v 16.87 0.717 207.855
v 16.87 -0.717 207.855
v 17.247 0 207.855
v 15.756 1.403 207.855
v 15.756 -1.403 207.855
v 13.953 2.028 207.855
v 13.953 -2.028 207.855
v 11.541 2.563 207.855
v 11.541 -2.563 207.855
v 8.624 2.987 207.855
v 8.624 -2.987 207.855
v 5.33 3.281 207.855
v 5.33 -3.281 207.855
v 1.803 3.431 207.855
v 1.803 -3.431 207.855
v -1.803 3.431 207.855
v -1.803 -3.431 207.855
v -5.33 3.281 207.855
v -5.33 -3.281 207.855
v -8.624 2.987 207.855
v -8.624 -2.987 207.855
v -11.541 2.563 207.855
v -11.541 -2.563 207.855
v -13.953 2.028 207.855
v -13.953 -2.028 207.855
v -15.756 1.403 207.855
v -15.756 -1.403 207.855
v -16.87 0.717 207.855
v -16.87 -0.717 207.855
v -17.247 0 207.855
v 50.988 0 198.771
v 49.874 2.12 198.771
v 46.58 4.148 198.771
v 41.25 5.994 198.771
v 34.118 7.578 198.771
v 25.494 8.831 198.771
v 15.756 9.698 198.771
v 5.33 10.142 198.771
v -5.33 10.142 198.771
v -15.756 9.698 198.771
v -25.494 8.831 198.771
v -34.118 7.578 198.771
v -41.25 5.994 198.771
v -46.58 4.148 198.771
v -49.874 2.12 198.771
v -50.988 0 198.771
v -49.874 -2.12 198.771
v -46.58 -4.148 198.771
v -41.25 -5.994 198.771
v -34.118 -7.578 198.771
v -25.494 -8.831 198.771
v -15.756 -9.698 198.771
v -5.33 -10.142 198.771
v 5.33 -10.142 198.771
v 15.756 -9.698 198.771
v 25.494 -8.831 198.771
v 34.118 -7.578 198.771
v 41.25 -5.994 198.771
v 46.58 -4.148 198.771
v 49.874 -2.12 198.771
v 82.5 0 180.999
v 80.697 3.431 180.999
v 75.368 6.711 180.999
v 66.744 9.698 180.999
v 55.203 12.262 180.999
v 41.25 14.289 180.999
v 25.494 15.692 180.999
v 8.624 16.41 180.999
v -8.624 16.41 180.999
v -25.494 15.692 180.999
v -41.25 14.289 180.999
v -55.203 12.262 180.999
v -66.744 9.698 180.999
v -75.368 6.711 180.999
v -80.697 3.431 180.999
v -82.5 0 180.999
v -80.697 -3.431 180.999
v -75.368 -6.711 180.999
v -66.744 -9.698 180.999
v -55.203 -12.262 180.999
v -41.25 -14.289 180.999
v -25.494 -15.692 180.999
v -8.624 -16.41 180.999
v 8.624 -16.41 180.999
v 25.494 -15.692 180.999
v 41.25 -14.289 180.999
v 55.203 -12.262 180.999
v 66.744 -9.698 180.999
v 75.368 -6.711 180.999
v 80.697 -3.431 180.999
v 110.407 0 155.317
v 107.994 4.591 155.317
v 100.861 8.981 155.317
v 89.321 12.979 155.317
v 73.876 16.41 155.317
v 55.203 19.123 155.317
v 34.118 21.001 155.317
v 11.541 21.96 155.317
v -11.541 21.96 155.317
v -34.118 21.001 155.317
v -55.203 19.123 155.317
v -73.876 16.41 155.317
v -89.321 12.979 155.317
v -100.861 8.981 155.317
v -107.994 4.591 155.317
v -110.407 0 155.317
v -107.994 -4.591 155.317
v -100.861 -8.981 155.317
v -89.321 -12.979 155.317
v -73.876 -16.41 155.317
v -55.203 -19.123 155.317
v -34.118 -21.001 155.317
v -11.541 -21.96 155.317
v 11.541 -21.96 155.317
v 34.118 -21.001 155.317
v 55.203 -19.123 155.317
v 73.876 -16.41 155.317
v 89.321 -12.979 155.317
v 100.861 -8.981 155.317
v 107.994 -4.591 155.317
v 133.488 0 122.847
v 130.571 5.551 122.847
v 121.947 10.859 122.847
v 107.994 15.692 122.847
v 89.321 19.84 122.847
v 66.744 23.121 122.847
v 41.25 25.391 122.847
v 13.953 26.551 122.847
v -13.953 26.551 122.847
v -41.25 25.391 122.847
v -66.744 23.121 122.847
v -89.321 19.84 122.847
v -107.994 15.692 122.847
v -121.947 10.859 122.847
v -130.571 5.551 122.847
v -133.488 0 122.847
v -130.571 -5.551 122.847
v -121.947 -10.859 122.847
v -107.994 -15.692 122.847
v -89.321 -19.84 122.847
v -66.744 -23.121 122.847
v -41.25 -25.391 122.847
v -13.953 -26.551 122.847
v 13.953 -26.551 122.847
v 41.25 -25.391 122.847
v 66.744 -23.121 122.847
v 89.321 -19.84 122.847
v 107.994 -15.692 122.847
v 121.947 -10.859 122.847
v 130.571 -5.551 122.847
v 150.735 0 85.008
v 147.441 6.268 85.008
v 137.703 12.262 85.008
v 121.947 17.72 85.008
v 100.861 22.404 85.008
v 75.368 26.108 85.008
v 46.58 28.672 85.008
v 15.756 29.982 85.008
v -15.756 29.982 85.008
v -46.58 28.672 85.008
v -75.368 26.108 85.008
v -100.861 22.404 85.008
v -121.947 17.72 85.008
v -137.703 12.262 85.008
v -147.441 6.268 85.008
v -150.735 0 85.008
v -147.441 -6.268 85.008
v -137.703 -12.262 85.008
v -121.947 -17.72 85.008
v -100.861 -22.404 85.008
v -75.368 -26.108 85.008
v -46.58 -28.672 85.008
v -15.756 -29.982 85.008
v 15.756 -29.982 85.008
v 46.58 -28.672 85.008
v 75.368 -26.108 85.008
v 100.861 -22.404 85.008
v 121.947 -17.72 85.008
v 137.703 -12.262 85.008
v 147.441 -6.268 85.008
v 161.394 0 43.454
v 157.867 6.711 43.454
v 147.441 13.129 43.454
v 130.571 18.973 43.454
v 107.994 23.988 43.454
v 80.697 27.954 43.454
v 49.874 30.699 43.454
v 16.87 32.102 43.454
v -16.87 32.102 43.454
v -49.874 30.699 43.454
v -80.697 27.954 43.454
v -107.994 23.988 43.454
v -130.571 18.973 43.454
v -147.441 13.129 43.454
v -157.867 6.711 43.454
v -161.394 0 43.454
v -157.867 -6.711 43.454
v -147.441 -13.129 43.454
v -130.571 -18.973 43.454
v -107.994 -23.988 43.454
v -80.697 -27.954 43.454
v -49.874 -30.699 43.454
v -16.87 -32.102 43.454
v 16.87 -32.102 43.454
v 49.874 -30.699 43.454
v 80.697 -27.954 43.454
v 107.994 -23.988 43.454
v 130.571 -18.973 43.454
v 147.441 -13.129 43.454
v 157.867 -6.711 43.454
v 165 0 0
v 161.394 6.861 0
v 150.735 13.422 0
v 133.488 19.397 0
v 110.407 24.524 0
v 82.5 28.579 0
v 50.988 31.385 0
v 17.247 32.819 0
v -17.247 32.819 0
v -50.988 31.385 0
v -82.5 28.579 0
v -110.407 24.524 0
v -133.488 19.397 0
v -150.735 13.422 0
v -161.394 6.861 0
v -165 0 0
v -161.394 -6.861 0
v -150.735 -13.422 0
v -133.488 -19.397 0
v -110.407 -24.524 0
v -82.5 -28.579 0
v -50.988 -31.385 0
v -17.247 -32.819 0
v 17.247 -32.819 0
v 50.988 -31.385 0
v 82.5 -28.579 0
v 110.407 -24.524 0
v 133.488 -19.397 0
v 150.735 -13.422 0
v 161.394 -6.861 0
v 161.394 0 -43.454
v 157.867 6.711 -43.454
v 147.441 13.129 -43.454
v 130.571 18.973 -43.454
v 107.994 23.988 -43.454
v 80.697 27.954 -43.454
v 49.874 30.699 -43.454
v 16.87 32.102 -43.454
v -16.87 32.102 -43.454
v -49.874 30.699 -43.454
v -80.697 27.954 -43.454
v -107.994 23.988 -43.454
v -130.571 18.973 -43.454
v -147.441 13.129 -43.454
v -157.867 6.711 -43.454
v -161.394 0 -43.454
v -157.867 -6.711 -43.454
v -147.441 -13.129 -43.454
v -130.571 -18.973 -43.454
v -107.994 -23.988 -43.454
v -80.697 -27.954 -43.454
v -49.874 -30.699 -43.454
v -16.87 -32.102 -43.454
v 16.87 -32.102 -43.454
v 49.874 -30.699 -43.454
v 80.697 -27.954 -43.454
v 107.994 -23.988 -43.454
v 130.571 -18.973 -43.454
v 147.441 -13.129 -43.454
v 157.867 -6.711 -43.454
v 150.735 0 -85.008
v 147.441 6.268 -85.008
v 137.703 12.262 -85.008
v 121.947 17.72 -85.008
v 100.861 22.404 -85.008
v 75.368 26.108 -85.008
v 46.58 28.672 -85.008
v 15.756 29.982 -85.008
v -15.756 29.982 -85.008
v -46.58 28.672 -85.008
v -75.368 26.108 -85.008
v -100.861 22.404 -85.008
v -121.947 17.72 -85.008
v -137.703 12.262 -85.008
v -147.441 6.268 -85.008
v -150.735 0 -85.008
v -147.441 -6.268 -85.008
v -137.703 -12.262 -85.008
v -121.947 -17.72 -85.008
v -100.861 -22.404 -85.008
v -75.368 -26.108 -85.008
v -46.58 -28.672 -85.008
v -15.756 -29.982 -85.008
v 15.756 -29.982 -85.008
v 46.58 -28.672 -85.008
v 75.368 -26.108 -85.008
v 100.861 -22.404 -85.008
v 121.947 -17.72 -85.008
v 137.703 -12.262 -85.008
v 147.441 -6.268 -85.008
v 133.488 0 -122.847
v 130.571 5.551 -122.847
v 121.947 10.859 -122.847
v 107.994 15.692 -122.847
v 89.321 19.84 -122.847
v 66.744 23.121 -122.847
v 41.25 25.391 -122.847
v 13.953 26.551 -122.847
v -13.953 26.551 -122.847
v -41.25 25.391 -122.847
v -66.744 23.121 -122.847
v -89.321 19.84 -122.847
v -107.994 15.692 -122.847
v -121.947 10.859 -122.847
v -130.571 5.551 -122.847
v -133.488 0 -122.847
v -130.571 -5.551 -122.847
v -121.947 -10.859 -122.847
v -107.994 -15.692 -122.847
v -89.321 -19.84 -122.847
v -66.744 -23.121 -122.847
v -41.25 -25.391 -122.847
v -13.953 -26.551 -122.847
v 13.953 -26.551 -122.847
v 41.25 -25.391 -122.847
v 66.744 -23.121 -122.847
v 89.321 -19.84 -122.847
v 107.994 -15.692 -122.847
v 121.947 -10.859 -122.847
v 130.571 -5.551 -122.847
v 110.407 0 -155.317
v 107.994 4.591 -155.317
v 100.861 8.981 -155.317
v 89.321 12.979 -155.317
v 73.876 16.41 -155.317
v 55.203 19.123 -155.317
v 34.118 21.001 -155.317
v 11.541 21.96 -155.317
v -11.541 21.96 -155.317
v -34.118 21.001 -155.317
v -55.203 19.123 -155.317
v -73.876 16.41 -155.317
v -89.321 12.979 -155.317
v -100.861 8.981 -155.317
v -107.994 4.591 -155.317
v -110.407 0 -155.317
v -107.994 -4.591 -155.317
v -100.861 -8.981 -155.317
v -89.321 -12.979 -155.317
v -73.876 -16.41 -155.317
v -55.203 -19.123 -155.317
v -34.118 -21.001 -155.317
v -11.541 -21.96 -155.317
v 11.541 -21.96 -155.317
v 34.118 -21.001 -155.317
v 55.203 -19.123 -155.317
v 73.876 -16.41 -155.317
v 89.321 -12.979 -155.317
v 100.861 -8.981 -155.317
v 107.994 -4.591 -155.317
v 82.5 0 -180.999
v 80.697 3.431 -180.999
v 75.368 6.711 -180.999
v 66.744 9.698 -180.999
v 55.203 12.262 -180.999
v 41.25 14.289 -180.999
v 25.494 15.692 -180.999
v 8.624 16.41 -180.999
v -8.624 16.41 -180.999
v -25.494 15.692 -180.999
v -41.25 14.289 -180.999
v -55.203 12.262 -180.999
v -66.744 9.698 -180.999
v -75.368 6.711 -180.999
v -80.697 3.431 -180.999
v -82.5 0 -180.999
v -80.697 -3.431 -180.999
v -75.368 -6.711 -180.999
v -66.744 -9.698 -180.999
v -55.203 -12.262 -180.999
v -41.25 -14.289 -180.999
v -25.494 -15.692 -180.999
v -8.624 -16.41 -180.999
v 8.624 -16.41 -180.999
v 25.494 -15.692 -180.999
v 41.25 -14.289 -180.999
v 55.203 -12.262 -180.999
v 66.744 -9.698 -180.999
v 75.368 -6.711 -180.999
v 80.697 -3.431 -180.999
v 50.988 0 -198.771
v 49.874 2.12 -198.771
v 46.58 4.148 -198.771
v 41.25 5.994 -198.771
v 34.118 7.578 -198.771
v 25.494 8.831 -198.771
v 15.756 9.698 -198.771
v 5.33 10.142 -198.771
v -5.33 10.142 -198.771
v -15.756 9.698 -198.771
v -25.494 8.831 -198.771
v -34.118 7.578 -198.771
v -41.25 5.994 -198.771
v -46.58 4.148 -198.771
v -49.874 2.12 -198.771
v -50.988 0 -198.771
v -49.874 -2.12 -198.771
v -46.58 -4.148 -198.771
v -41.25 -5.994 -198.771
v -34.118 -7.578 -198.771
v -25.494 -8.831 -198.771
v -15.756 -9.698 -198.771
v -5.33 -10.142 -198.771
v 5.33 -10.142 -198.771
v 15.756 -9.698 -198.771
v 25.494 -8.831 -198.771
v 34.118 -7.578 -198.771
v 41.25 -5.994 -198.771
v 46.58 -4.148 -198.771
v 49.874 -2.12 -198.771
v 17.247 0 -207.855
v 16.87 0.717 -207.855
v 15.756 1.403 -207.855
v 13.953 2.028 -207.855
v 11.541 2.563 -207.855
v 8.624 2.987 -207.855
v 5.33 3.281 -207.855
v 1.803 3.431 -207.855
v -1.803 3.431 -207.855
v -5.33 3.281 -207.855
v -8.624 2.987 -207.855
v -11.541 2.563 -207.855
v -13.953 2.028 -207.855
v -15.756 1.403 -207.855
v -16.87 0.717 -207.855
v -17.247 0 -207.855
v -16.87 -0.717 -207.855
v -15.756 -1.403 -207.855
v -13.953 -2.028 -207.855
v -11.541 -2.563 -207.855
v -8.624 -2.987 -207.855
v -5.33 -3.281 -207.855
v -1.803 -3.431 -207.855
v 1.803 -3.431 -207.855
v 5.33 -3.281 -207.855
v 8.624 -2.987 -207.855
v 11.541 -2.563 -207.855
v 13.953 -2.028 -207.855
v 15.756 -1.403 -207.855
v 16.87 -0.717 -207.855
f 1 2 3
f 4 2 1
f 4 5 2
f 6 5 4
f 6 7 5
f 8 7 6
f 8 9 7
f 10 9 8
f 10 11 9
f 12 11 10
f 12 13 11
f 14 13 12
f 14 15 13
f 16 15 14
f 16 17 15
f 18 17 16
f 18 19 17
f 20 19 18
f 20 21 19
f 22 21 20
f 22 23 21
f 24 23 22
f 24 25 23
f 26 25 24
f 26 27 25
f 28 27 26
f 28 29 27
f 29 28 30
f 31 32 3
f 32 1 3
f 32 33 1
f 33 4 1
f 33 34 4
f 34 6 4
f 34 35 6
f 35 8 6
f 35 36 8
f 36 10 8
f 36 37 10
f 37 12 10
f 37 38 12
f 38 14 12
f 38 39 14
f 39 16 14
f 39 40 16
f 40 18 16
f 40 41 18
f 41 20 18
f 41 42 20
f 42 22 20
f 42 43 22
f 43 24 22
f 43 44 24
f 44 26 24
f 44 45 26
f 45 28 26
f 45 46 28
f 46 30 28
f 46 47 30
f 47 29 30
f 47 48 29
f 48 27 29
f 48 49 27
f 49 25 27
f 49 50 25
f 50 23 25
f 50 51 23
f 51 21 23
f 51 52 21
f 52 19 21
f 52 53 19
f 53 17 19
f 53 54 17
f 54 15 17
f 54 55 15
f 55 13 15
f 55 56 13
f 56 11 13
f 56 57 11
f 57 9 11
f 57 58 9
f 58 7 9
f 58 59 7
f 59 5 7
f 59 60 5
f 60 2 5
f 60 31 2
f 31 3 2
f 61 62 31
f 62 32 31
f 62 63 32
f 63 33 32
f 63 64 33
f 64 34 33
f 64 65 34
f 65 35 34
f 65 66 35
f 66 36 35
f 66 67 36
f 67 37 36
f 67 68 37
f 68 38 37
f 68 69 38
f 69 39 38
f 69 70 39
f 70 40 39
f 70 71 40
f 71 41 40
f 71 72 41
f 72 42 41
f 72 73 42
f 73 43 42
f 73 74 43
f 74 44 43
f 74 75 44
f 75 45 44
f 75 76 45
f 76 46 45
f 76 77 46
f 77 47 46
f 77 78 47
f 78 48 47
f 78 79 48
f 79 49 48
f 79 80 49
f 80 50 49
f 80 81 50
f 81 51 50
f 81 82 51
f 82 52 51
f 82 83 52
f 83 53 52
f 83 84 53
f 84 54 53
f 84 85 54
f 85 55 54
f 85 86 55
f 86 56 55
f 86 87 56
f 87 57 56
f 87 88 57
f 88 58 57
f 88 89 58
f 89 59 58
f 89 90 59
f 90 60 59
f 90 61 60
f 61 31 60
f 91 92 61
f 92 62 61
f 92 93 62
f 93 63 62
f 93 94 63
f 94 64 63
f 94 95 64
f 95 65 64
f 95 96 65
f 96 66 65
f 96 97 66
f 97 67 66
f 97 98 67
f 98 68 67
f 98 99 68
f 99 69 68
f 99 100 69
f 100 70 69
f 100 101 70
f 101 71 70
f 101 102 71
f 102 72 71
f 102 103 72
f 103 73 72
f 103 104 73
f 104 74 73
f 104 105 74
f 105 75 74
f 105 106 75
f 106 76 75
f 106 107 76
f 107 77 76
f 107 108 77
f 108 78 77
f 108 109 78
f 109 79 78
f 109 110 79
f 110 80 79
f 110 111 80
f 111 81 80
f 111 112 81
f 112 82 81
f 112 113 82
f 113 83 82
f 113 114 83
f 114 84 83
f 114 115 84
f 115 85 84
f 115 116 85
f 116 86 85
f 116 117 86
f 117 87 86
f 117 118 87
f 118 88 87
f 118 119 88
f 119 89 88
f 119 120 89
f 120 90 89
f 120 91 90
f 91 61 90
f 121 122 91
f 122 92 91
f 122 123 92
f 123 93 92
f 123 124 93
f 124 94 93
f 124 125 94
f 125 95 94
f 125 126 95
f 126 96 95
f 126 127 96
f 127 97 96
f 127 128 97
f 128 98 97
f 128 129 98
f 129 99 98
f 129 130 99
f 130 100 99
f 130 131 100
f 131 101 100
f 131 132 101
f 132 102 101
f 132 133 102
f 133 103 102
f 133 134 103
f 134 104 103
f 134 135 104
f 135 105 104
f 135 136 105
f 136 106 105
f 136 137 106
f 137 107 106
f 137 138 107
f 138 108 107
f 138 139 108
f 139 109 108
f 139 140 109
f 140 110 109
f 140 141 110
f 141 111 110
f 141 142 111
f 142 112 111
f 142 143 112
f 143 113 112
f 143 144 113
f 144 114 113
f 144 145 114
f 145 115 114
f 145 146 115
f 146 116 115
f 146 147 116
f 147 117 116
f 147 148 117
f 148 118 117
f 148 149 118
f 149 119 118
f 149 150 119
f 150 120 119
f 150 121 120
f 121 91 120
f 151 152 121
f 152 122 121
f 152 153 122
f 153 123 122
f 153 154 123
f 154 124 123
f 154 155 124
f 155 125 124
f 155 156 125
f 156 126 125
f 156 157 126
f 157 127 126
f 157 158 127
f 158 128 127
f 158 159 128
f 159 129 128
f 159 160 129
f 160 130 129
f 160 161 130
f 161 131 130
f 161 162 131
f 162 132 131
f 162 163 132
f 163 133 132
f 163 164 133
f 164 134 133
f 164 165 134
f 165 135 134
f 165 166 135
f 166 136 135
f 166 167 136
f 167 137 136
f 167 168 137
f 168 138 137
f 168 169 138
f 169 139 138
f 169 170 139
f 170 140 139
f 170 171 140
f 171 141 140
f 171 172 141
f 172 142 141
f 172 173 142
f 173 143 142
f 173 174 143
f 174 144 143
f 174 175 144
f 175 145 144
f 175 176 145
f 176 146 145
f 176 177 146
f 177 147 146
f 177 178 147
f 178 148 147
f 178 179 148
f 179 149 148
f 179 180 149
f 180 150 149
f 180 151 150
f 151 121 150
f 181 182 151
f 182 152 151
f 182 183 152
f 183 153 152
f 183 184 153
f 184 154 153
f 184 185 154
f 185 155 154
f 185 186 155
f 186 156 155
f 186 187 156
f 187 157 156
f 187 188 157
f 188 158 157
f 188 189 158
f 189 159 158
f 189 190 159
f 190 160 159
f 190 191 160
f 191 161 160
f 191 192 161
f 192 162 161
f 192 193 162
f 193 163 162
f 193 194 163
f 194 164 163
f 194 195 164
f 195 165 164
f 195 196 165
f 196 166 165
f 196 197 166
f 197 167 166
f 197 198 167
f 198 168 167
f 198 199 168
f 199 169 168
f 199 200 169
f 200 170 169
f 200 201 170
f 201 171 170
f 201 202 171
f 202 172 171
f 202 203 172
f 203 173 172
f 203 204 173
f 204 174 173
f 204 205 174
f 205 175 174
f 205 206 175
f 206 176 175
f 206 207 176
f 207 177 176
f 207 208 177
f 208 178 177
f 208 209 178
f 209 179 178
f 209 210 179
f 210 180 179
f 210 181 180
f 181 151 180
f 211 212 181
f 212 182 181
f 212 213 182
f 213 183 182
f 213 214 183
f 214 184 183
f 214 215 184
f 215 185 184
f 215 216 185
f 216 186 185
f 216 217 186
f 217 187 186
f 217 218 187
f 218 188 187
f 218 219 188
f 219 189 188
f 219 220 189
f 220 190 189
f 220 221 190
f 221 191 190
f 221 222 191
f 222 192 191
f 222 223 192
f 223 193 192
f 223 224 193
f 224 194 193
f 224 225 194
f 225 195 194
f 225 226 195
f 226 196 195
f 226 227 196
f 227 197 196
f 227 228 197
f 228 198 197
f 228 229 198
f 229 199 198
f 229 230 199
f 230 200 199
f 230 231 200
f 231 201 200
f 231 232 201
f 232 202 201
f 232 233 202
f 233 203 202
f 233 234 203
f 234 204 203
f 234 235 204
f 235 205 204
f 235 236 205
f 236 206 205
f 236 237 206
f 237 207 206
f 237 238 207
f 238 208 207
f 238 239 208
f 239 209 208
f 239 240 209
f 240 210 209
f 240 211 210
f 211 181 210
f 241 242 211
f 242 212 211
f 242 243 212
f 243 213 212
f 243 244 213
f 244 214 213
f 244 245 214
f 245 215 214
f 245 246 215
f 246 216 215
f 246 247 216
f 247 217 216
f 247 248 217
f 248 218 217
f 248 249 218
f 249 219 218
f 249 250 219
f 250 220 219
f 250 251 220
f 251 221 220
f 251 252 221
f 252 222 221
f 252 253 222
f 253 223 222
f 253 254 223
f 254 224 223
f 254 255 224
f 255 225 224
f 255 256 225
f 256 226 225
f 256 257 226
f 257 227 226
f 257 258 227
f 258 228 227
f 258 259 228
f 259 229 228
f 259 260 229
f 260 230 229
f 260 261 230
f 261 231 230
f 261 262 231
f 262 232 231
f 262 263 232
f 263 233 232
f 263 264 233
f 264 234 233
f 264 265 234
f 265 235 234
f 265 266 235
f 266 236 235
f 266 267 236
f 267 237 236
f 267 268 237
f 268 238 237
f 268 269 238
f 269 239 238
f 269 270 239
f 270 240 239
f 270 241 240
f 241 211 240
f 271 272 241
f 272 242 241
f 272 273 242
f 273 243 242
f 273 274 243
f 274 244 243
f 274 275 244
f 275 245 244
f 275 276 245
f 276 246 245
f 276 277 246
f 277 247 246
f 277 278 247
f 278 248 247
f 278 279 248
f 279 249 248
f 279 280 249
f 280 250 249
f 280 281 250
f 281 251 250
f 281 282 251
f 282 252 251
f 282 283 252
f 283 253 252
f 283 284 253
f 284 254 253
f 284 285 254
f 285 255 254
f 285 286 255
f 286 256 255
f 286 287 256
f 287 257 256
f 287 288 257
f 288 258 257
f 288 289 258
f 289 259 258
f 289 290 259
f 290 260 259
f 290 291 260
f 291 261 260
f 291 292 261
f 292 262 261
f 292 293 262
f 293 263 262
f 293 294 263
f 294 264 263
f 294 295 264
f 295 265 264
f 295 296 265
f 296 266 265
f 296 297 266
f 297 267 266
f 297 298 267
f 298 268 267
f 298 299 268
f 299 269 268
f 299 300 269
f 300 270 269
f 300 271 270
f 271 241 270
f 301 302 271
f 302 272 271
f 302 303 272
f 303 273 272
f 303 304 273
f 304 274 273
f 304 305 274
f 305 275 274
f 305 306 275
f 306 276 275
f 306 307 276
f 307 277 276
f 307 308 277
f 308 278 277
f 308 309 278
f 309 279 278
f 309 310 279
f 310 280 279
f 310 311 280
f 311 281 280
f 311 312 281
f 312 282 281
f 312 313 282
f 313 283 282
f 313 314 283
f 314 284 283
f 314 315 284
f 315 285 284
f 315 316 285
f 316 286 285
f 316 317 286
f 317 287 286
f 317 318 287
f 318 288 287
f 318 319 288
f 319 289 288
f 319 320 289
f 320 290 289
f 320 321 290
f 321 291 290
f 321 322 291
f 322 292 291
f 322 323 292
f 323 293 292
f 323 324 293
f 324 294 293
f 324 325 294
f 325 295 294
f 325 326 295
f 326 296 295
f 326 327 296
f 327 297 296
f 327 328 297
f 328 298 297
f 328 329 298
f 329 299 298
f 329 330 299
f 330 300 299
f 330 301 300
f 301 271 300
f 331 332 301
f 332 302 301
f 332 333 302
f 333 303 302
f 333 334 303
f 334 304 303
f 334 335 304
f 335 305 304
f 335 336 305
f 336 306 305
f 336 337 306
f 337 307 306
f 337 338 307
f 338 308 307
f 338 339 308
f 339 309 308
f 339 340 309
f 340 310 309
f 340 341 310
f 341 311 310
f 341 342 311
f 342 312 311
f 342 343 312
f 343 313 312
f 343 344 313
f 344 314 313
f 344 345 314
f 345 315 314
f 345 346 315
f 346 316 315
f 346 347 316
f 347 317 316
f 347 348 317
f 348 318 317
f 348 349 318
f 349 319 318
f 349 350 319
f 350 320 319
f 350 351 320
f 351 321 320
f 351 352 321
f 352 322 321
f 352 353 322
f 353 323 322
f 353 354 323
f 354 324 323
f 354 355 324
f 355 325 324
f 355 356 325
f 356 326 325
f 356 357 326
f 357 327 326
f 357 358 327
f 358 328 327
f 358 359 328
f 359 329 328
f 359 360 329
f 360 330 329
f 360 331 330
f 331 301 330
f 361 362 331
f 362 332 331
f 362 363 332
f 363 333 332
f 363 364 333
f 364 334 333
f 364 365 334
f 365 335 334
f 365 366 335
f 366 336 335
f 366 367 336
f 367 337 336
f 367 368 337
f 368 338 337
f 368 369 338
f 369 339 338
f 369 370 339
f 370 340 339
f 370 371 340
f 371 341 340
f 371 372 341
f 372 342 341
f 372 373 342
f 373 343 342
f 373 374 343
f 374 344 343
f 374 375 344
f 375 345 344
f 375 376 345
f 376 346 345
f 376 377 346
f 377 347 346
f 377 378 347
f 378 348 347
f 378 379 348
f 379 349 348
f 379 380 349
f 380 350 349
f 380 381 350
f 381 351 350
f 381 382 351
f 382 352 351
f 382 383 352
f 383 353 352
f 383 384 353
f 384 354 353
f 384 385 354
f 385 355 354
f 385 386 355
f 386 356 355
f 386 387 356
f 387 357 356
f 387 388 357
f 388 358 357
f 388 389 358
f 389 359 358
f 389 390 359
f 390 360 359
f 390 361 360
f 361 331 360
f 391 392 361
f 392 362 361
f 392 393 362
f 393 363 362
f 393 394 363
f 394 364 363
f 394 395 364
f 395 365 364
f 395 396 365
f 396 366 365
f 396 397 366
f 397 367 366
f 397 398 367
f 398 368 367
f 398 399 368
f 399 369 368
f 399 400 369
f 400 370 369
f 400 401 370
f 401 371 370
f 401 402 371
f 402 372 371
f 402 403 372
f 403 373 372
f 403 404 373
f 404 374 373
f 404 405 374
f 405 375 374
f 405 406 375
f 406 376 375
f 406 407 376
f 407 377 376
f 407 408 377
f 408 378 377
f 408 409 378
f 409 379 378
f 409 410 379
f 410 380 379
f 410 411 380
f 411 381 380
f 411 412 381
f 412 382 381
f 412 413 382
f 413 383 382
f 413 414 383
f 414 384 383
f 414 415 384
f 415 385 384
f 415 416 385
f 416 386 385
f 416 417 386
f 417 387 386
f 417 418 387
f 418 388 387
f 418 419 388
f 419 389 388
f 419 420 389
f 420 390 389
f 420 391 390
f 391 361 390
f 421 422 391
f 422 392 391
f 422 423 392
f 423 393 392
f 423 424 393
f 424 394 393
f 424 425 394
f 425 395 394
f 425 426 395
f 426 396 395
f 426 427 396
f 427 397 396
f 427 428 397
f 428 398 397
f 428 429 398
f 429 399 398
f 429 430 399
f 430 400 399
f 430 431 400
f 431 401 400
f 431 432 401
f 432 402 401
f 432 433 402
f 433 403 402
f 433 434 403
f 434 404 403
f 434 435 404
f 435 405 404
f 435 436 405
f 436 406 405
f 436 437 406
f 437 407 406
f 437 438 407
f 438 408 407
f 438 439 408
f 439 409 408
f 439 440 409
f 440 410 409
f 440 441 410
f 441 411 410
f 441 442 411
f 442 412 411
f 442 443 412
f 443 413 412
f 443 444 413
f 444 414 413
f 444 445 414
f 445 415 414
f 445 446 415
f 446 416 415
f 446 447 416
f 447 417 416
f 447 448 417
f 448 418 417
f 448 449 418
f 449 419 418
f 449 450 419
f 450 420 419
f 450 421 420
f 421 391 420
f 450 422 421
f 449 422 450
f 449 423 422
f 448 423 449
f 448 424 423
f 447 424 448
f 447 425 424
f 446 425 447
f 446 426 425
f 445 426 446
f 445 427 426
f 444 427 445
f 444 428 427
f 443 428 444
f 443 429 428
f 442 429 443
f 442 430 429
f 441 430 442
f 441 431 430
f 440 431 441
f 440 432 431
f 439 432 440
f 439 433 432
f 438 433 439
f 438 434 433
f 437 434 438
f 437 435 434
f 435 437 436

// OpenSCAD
// Generated by SolidPython 1.0.1 on 2020-07-29 00:46:51


scale(v = [15, 3, 19]) {
	sphere(r = 11);
}
/***********************************************
*********      SolidPython code:      **********
************************************************
 
# import packages: SolidPython
from solid import *
from solid.utils import *
from itertools import chain, combinations, permutations


class Resize:

    def __init__(self, scad_file):
        self.scad_file = scad_file
        #self.scad_file = import_scad(scad_file)
        # cone/cylinder param:
        self.r1 = 0
        self.r2 = 0
        self.h = 0
        # rectangular prism param:
        self.w = 0
        self.l = 0
        # ellipse param:
        self.r = 0

    # import OpenScad code (file name corresponds to shape)


    # classify shape + parameters
    def assign(self, param1, param2, param3):
        if self.scad_file == 'cone.scad':
            self.r1 = param1
            self.r2 = param2
            self.h = param3
        elif self.scad_file == 'cylinder.scad':
            self.r1 = param1
            self.r2 = param2
            self.h = param3
        elif self.scad_file == 'rectangularPrism.scad':
            self.h = param1
            self.l = param2
            self.w = param3
        else:
            self.r = param1
            self.h = param2

    # resize parameters
    def iterate(self):
        x = range(3, 20, 2)
        i = 1
        if self.scad_file == 'cone.scad':
            tempList = list(permutations(x, 2))
            for temp in tempList:
                param1 = temp[0]
                param2 = temp[1]
                filepath = 'produced_scad_files/' + 'cone' + str(param1) + '_' + str(param2) + '_' + '.scad'
                scad_render_to_file(cylinder(h=param1, r1=param2, r2=0), filepath)

        elif self.scad_file == 'cylinder.scad':
            tempList = list(permutations(x, 3))
            for temp in tempList:
                param1 = temp[0]
                param2 = temp[1]
                filepath = 'produced_scad_files/' + 'cylinder' + str(param1) + '_' + str(param2) + '_' + '.scad'
                scad_render_to_file(cylinder(h=param1, r1=param2, r2=param2), filepath)

        elif self.scad_file == 'rectangularPrism.scad':
            tempList = list(permutations(x, 3))
            for temp in tempList:
                param1 = temp[0]
                param2 = temp[1]
                param3 = temp[2]
                filepath = 'produced_scad_files/' + 'rectangularPrism' + str(param1) + '_' + str(param2) + '_' + str(
                    param3) + '.scad'
                scad_render_to_file(cube(size=(param1, param2, param3)), filepath)

        elif self.scad_file == 'ellipse.scad':
            tempList = list(permutations(x, 4))
            for temp in tempList:
                param1 = temp[0]
                param2 = temp[1]
                param3 = temp[2]
                param4 = temp[3]
                filepath = 'produced_scad_files/' + 'ellipse' + str(param1) + '_' + str(param2) + '_' + str(param3) + '_' + str(param4) + '.scad'
                scad_render_to_file(scale([param1, param2, param3])(sphere(r=param4)), filepath)

    def render_to_scadfile(self):
        scad_render_to_file(scad, 'example.scad') 
 
************************************************/
